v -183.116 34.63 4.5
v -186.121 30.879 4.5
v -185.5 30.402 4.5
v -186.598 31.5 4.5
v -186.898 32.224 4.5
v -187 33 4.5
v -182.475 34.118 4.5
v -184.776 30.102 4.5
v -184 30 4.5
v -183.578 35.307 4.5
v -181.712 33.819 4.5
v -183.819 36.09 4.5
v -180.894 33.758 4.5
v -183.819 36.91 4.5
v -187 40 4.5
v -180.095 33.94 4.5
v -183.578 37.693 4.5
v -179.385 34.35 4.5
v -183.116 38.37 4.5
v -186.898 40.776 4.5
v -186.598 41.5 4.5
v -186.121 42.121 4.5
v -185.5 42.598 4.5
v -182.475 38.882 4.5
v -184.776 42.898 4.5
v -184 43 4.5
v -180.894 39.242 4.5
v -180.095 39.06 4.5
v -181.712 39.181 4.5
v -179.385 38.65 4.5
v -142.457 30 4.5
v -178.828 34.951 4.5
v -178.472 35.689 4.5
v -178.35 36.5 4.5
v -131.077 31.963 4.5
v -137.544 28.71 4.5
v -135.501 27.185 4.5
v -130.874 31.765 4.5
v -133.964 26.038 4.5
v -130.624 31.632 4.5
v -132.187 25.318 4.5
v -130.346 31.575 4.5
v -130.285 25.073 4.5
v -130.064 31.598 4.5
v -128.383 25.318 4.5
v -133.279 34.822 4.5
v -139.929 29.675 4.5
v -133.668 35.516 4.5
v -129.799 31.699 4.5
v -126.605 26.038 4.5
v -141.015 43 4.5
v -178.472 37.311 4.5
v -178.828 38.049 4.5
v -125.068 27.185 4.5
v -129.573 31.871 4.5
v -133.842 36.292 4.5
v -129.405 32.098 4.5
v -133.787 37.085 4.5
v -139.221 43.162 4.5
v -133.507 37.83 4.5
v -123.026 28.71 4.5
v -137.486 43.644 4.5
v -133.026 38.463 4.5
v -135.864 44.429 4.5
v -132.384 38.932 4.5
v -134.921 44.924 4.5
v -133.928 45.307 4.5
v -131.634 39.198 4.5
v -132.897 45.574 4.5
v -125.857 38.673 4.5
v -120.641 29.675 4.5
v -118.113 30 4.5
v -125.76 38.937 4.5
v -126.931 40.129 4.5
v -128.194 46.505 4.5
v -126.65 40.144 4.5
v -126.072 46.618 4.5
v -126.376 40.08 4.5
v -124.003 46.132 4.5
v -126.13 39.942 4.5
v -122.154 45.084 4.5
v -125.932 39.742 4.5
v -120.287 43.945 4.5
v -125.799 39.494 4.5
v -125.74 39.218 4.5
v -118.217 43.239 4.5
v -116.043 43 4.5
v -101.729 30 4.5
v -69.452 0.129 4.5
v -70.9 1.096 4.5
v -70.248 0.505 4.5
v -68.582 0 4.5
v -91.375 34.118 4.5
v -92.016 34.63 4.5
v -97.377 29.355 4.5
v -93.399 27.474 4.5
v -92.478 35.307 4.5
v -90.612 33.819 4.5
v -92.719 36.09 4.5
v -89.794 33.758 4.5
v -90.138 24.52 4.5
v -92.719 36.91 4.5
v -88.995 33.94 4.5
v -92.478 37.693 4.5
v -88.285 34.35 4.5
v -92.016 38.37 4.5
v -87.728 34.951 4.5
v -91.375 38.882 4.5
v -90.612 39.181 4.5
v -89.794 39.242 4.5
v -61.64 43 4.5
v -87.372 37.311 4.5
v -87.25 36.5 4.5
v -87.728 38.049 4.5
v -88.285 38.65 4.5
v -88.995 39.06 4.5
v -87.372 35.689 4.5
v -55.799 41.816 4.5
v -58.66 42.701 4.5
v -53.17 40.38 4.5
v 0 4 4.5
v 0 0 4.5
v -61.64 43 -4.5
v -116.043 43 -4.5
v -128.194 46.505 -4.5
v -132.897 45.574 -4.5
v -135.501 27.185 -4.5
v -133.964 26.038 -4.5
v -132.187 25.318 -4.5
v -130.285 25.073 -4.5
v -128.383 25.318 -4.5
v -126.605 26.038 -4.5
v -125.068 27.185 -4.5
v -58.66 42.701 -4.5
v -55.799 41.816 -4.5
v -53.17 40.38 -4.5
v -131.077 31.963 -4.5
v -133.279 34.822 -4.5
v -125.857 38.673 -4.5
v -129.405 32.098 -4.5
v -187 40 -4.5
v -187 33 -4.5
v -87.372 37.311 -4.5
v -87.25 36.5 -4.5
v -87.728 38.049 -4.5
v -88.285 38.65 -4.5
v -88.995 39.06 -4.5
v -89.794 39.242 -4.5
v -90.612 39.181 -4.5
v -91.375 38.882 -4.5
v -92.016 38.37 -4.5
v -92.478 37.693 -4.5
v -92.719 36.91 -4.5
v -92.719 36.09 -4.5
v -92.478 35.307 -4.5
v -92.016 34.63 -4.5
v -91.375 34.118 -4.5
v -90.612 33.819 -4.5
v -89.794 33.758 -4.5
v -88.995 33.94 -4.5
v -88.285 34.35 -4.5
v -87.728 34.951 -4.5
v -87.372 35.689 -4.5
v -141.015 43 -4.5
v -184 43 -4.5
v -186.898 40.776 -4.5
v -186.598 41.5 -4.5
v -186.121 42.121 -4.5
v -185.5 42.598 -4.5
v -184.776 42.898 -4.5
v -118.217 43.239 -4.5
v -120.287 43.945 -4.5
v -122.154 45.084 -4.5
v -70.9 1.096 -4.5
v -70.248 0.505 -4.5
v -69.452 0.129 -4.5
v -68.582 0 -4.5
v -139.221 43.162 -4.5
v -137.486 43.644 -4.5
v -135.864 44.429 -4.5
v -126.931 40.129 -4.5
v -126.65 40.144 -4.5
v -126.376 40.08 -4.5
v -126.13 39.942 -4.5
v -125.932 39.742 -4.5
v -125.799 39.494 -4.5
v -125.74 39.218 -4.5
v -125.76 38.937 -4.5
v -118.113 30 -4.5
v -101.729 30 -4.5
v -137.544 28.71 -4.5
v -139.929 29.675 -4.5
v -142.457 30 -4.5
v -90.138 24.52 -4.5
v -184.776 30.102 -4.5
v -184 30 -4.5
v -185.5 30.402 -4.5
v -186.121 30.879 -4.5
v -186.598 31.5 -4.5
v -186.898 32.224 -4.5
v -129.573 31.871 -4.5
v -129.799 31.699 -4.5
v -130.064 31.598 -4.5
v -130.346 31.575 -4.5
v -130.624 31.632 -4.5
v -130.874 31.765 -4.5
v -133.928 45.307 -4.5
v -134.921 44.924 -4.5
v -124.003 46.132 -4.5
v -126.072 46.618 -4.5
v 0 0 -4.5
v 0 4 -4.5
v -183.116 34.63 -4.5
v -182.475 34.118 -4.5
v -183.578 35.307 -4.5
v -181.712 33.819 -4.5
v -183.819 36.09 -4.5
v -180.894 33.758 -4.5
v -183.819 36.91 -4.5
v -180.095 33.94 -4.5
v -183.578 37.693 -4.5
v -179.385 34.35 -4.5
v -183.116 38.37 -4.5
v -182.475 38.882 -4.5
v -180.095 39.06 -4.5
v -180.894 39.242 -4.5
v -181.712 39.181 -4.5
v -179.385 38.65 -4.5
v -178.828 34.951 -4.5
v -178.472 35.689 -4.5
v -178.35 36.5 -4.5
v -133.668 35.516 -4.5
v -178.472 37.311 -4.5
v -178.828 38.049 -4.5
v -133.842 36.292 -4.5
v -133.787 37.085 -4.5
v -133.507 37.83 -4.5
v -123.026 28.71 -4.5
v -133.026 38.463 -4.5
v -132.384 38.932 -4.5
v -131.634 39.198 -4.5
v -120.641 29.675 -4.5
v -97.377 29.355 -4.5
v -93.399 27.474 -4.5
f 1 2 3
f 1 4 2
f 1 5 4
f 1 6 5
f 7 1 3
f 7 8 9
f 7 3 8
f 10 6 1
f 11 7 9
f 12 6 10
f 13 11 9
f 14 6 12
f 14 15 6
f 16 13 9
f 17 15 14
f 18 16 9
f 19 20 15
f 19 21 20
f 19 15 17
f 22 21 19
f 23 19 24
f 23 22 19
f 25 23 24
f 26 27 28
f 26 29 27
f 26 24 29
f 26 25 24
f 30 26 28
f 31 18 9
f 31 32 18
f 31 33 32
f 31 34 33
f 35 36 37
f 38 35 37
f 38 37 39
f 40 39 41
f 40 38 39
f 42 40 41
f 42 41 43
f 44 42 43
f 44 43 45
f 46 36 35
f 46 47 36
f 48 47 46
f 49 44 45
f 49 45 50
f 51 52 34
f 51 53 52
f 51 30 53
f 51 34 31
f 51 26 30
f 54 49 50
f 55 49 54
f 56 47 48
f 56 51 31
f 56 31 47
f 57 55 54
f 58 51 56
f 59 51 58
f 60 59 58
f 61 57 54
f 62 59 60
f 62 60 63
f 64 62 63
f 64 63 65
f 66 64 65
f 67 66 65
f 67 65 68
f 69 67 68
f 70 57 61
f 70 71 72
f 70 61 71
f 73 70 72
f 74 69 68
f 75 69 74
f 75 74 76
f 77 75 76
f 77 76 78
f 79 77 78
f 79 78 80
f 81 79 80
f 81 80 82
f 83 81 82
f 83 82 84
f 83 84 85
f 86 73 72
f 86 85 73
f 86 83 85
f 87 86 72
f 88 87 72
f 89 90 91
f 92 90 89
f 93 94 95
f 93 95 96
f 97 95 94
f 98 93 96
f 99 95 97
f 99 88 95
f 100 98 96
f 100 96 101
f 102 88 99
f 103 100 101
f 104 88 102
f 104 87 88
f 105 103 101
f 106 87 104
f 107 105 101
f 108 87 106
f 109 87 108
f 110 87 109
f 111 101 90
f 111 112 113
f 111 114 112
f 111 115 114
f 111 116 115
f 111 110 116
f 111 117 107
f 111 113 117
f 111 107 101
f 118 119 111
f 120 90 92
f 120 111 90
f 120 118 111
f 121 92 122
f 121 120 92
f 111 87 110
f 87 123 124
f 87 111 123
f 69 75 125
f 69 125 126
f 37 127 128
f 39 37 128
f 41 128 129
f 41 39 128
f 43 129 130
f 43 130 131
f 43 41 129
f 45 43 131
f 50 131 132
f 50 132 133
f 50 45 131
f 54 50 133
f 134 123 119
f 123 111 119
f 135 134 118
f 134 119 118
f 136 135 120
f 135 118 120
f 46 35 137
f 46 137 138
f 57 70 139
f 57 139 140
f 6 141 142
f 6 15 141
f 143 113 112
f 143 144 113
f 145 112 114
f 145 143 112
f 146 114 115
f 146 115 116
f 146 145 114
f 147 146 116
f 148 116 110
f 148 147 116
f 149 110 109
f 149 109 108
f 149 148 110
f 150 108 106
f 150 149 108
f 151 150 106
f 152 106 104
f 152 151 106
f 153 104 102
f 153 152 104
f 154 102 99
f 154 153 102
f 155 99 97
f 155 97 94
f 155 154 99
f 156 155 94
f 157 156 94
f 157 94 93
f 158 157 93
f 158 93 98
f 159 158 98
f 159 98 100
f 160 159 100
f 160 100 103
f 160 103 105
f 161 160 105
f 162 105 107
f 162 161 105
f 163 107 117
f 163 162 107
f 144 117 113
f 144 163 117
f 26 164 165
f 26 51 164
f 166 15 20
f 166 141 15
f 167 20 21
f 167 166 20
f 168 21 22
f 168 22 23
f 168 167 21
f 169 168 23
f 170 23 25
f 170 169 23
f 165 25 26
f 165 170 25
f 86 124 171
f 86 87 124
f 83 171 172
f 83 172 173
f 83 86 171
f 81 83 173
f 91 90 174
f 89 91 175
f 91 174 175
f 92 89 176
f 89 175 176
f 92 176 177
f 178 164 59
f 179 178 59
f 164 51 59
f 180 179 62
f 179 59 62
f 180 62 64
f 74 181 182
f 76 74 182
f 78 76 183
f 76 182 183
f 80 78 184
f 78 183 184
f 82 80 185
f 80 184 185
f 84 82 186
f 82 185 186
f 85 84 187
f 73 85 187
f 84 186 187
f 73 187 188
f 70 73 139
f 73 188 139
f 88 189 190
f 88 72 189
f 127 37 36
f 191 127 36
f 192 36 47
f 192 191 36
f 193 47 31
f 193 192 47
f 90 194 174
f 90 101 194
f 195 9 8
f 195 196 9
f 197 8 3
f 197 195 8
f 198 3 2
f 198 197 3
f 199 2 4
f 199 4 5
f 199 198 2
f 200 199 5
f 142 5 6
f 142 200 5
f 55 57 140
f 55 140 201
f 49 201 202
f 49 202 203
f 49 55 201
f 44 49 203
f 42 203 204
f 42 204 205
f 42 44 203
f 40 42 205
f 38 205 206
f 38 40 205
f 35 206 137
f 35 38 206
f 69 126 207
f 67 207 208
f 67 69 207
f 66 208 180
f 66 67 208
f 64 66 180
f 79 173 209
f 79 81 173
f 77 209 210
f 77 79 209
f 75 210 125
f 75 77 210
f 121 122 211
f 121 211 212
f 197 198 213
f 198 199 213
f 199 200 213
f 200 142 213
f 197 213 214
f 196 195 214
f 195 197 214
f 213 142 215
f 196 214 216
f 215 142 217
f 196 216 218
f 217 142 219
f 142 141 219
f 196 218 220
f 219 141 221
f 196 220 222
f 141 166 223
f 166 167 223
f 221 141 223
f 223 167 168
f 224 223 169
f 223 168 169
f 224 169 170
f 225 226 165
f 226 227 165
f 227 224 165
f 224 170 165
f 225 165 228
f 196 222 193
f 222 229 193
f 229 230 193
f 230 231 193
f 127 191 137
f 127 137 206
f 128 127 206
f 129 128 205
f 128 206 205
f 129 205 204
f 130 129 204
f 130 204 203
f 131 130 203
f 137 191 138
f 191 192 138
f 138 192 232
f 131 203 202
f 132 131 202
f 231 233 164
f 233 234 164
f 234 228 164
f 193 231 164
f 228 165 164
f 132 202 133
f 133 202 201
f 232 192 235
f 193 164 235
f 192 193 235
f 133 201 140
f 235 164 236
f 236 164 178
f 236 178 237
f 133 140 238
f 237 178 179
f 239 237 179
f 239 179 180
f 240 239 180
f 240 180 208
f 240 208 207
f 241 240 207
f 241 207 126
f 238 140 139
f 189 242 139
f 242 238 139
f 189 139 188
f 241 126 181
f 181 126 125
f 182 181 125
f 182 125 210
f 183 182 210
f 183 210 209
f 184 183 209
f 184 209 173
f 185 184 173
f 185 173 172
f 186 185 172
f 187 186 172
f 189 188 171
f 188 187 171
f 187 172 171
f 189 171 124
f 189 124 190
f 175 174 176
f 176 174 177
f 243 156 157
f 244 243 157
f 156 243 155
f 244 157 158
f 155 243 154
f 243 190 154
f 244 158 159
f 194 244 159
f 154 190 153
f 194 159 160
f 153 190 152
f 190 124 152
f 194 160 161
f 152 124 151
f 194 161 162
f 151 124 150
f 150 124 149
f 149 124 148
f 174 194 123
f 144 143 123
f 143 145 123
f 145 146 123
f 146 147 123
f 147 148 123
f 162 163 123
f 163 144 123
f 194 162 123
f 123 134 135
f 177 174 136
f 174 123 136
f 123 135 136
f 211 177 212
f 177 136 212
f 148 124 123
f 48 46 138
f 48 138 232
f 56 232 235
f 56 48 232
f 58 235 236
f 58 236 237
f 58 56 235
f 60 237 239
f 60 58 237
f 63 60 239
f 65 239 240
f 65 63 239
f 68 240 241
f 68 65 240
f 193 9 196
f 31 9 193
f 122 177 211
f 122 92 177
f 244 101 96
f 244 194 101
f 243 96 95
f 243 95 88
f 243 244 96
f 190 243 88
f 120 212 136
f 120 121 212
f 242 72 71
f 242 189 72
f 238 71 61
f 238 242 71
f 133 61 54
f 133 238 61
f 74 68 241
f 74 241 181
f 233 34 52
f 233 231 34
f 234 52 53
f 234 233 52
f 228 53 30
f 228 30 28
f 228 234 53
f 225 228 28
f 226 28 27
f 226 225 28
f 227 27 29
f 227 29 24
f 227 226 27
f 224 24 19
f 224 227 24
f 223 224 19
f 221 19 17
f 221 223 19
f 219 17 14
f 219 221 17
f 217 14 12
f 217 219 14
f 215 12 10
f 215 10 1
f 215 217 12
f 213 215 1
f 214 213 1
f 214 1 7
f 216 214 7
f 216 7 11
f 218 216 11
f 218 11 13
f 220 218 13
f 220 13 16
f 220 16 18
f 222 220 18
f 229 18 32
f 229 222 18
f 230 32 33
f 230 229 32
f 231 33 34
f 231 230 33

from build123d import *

# Parameters (mm, degrees)
SKETCH3_R           = 2.75
BOSS_EXTRUDE3_DEPTH = 4.5
FILLET13_R          = 15
FILLET14_R          = 10
FILLET15_R          = 3


with BuildPart() as part:
    # Sketch3 → Boss-Extrude3 (new body, symmetric)
    with BuildSketch(Plane.XY):
        with BuildLine():
            Line((-70, 0), (0, 0))
            Line((0, 0), (0, 4))
            Line((0, 4), (-57, 43))
            Line((-57, 43), (-120.301993943, 43))
            ThreePointArc((-120.301993943, 43), (-123.692897096, 46.002238478), (-128.193883581, 46.505011528))
            Line((-128.193883581, 46.505011528), (-132.896667749, 45.573835187))
            ThreePointArc((-132.896667749, 45.573835187), (-135.482170861, 44.646108184), (-137.681223291, 43))
            Line((-137.681223291, 43), (-187, 43))
            Line((-187, 43), (-187, 30))
            Line((-187, 30), (-137.769349371, 30))
            Line((-137.769349371, 30), (-136.22697347, 27.997184072))
            ThreePointArc((-136.22697347, 27.997184072), (-129.680147263, 25.097686291), (-123.684421639, 29.011673389))
            Line((-123.684421639, 29.011673389), (-123.151115414, 30))
            Line((-123.151115414, 30), (-94.638255551, 30))
            Line((-94.638255551, 30), (-70, 0))
        make_face()
        with Locations((-90, 36.5)):
            Circle(SKETCH3_R, mode=Mode.SUBTRACT)
        with BuildLine():
            ThreePointArc((-133.278796519, 34.822100799), (-133.674163723, 37.467564533), (-131.634144466, 39.197626677))
            Line((-131.634144466, 39.197626677), (-126.931360298, 40.128803018))
            ThreePointArc((-126.931360298, 40.128803018), (-125.932483215, 39.741607136), (-125.857075346, 38.672967941))
            Line((-125.857075346, 38.672967941), (-129.404750544, 32.09839288))
            ThreePointArc((-129.404750544, 32.09839288), (-130.204180628, 31.576527934), (-131.077090788, 31.963127638))
            Line((-131.077090788, 31.963127638), (-133.278796519, 34.822100799))
        make_face(mode=Mode.SUBTRACT)
        with Locations((-181.1, 36.5)):
            Circle(SKETCH3_R, mode=Mode.SUBTRACT)
    extrude(amount=BOSS_EXTRUDE3_DEPTH, both=True)

    # Fillet13
    fillet13_edges = [part.edges().sort_by_distance(p)[0] for p in [
        (-57, 43, 0),
        (-94.638255551, 30, 0),
    ]]
    fillet(fillet13_edges, radius=FILLET13_R)

    # Fillet14
    fillet14_edges = [part.edges().sort_by_distance(p)[0] for p in [
        (-120.301993943, 43, 0),
        (-137.681223291, 43, 0),
        (-137.769349371, 30, 0),
        (-123.151115414, 30, 0),
    ]]
    fillet(fillet14_edges, radius=FILLET14_R)

    # Fillet15
    fillet15_edges = [part.edges().sort_by_distance(p)[0] for p in [
        (-70, 0, 0),
        (-187, 30, 0),
        (-187, 43, 0),
    ]]
    fillet(fillet15_edges, radius=FILLET15_R)


solid = part.part
